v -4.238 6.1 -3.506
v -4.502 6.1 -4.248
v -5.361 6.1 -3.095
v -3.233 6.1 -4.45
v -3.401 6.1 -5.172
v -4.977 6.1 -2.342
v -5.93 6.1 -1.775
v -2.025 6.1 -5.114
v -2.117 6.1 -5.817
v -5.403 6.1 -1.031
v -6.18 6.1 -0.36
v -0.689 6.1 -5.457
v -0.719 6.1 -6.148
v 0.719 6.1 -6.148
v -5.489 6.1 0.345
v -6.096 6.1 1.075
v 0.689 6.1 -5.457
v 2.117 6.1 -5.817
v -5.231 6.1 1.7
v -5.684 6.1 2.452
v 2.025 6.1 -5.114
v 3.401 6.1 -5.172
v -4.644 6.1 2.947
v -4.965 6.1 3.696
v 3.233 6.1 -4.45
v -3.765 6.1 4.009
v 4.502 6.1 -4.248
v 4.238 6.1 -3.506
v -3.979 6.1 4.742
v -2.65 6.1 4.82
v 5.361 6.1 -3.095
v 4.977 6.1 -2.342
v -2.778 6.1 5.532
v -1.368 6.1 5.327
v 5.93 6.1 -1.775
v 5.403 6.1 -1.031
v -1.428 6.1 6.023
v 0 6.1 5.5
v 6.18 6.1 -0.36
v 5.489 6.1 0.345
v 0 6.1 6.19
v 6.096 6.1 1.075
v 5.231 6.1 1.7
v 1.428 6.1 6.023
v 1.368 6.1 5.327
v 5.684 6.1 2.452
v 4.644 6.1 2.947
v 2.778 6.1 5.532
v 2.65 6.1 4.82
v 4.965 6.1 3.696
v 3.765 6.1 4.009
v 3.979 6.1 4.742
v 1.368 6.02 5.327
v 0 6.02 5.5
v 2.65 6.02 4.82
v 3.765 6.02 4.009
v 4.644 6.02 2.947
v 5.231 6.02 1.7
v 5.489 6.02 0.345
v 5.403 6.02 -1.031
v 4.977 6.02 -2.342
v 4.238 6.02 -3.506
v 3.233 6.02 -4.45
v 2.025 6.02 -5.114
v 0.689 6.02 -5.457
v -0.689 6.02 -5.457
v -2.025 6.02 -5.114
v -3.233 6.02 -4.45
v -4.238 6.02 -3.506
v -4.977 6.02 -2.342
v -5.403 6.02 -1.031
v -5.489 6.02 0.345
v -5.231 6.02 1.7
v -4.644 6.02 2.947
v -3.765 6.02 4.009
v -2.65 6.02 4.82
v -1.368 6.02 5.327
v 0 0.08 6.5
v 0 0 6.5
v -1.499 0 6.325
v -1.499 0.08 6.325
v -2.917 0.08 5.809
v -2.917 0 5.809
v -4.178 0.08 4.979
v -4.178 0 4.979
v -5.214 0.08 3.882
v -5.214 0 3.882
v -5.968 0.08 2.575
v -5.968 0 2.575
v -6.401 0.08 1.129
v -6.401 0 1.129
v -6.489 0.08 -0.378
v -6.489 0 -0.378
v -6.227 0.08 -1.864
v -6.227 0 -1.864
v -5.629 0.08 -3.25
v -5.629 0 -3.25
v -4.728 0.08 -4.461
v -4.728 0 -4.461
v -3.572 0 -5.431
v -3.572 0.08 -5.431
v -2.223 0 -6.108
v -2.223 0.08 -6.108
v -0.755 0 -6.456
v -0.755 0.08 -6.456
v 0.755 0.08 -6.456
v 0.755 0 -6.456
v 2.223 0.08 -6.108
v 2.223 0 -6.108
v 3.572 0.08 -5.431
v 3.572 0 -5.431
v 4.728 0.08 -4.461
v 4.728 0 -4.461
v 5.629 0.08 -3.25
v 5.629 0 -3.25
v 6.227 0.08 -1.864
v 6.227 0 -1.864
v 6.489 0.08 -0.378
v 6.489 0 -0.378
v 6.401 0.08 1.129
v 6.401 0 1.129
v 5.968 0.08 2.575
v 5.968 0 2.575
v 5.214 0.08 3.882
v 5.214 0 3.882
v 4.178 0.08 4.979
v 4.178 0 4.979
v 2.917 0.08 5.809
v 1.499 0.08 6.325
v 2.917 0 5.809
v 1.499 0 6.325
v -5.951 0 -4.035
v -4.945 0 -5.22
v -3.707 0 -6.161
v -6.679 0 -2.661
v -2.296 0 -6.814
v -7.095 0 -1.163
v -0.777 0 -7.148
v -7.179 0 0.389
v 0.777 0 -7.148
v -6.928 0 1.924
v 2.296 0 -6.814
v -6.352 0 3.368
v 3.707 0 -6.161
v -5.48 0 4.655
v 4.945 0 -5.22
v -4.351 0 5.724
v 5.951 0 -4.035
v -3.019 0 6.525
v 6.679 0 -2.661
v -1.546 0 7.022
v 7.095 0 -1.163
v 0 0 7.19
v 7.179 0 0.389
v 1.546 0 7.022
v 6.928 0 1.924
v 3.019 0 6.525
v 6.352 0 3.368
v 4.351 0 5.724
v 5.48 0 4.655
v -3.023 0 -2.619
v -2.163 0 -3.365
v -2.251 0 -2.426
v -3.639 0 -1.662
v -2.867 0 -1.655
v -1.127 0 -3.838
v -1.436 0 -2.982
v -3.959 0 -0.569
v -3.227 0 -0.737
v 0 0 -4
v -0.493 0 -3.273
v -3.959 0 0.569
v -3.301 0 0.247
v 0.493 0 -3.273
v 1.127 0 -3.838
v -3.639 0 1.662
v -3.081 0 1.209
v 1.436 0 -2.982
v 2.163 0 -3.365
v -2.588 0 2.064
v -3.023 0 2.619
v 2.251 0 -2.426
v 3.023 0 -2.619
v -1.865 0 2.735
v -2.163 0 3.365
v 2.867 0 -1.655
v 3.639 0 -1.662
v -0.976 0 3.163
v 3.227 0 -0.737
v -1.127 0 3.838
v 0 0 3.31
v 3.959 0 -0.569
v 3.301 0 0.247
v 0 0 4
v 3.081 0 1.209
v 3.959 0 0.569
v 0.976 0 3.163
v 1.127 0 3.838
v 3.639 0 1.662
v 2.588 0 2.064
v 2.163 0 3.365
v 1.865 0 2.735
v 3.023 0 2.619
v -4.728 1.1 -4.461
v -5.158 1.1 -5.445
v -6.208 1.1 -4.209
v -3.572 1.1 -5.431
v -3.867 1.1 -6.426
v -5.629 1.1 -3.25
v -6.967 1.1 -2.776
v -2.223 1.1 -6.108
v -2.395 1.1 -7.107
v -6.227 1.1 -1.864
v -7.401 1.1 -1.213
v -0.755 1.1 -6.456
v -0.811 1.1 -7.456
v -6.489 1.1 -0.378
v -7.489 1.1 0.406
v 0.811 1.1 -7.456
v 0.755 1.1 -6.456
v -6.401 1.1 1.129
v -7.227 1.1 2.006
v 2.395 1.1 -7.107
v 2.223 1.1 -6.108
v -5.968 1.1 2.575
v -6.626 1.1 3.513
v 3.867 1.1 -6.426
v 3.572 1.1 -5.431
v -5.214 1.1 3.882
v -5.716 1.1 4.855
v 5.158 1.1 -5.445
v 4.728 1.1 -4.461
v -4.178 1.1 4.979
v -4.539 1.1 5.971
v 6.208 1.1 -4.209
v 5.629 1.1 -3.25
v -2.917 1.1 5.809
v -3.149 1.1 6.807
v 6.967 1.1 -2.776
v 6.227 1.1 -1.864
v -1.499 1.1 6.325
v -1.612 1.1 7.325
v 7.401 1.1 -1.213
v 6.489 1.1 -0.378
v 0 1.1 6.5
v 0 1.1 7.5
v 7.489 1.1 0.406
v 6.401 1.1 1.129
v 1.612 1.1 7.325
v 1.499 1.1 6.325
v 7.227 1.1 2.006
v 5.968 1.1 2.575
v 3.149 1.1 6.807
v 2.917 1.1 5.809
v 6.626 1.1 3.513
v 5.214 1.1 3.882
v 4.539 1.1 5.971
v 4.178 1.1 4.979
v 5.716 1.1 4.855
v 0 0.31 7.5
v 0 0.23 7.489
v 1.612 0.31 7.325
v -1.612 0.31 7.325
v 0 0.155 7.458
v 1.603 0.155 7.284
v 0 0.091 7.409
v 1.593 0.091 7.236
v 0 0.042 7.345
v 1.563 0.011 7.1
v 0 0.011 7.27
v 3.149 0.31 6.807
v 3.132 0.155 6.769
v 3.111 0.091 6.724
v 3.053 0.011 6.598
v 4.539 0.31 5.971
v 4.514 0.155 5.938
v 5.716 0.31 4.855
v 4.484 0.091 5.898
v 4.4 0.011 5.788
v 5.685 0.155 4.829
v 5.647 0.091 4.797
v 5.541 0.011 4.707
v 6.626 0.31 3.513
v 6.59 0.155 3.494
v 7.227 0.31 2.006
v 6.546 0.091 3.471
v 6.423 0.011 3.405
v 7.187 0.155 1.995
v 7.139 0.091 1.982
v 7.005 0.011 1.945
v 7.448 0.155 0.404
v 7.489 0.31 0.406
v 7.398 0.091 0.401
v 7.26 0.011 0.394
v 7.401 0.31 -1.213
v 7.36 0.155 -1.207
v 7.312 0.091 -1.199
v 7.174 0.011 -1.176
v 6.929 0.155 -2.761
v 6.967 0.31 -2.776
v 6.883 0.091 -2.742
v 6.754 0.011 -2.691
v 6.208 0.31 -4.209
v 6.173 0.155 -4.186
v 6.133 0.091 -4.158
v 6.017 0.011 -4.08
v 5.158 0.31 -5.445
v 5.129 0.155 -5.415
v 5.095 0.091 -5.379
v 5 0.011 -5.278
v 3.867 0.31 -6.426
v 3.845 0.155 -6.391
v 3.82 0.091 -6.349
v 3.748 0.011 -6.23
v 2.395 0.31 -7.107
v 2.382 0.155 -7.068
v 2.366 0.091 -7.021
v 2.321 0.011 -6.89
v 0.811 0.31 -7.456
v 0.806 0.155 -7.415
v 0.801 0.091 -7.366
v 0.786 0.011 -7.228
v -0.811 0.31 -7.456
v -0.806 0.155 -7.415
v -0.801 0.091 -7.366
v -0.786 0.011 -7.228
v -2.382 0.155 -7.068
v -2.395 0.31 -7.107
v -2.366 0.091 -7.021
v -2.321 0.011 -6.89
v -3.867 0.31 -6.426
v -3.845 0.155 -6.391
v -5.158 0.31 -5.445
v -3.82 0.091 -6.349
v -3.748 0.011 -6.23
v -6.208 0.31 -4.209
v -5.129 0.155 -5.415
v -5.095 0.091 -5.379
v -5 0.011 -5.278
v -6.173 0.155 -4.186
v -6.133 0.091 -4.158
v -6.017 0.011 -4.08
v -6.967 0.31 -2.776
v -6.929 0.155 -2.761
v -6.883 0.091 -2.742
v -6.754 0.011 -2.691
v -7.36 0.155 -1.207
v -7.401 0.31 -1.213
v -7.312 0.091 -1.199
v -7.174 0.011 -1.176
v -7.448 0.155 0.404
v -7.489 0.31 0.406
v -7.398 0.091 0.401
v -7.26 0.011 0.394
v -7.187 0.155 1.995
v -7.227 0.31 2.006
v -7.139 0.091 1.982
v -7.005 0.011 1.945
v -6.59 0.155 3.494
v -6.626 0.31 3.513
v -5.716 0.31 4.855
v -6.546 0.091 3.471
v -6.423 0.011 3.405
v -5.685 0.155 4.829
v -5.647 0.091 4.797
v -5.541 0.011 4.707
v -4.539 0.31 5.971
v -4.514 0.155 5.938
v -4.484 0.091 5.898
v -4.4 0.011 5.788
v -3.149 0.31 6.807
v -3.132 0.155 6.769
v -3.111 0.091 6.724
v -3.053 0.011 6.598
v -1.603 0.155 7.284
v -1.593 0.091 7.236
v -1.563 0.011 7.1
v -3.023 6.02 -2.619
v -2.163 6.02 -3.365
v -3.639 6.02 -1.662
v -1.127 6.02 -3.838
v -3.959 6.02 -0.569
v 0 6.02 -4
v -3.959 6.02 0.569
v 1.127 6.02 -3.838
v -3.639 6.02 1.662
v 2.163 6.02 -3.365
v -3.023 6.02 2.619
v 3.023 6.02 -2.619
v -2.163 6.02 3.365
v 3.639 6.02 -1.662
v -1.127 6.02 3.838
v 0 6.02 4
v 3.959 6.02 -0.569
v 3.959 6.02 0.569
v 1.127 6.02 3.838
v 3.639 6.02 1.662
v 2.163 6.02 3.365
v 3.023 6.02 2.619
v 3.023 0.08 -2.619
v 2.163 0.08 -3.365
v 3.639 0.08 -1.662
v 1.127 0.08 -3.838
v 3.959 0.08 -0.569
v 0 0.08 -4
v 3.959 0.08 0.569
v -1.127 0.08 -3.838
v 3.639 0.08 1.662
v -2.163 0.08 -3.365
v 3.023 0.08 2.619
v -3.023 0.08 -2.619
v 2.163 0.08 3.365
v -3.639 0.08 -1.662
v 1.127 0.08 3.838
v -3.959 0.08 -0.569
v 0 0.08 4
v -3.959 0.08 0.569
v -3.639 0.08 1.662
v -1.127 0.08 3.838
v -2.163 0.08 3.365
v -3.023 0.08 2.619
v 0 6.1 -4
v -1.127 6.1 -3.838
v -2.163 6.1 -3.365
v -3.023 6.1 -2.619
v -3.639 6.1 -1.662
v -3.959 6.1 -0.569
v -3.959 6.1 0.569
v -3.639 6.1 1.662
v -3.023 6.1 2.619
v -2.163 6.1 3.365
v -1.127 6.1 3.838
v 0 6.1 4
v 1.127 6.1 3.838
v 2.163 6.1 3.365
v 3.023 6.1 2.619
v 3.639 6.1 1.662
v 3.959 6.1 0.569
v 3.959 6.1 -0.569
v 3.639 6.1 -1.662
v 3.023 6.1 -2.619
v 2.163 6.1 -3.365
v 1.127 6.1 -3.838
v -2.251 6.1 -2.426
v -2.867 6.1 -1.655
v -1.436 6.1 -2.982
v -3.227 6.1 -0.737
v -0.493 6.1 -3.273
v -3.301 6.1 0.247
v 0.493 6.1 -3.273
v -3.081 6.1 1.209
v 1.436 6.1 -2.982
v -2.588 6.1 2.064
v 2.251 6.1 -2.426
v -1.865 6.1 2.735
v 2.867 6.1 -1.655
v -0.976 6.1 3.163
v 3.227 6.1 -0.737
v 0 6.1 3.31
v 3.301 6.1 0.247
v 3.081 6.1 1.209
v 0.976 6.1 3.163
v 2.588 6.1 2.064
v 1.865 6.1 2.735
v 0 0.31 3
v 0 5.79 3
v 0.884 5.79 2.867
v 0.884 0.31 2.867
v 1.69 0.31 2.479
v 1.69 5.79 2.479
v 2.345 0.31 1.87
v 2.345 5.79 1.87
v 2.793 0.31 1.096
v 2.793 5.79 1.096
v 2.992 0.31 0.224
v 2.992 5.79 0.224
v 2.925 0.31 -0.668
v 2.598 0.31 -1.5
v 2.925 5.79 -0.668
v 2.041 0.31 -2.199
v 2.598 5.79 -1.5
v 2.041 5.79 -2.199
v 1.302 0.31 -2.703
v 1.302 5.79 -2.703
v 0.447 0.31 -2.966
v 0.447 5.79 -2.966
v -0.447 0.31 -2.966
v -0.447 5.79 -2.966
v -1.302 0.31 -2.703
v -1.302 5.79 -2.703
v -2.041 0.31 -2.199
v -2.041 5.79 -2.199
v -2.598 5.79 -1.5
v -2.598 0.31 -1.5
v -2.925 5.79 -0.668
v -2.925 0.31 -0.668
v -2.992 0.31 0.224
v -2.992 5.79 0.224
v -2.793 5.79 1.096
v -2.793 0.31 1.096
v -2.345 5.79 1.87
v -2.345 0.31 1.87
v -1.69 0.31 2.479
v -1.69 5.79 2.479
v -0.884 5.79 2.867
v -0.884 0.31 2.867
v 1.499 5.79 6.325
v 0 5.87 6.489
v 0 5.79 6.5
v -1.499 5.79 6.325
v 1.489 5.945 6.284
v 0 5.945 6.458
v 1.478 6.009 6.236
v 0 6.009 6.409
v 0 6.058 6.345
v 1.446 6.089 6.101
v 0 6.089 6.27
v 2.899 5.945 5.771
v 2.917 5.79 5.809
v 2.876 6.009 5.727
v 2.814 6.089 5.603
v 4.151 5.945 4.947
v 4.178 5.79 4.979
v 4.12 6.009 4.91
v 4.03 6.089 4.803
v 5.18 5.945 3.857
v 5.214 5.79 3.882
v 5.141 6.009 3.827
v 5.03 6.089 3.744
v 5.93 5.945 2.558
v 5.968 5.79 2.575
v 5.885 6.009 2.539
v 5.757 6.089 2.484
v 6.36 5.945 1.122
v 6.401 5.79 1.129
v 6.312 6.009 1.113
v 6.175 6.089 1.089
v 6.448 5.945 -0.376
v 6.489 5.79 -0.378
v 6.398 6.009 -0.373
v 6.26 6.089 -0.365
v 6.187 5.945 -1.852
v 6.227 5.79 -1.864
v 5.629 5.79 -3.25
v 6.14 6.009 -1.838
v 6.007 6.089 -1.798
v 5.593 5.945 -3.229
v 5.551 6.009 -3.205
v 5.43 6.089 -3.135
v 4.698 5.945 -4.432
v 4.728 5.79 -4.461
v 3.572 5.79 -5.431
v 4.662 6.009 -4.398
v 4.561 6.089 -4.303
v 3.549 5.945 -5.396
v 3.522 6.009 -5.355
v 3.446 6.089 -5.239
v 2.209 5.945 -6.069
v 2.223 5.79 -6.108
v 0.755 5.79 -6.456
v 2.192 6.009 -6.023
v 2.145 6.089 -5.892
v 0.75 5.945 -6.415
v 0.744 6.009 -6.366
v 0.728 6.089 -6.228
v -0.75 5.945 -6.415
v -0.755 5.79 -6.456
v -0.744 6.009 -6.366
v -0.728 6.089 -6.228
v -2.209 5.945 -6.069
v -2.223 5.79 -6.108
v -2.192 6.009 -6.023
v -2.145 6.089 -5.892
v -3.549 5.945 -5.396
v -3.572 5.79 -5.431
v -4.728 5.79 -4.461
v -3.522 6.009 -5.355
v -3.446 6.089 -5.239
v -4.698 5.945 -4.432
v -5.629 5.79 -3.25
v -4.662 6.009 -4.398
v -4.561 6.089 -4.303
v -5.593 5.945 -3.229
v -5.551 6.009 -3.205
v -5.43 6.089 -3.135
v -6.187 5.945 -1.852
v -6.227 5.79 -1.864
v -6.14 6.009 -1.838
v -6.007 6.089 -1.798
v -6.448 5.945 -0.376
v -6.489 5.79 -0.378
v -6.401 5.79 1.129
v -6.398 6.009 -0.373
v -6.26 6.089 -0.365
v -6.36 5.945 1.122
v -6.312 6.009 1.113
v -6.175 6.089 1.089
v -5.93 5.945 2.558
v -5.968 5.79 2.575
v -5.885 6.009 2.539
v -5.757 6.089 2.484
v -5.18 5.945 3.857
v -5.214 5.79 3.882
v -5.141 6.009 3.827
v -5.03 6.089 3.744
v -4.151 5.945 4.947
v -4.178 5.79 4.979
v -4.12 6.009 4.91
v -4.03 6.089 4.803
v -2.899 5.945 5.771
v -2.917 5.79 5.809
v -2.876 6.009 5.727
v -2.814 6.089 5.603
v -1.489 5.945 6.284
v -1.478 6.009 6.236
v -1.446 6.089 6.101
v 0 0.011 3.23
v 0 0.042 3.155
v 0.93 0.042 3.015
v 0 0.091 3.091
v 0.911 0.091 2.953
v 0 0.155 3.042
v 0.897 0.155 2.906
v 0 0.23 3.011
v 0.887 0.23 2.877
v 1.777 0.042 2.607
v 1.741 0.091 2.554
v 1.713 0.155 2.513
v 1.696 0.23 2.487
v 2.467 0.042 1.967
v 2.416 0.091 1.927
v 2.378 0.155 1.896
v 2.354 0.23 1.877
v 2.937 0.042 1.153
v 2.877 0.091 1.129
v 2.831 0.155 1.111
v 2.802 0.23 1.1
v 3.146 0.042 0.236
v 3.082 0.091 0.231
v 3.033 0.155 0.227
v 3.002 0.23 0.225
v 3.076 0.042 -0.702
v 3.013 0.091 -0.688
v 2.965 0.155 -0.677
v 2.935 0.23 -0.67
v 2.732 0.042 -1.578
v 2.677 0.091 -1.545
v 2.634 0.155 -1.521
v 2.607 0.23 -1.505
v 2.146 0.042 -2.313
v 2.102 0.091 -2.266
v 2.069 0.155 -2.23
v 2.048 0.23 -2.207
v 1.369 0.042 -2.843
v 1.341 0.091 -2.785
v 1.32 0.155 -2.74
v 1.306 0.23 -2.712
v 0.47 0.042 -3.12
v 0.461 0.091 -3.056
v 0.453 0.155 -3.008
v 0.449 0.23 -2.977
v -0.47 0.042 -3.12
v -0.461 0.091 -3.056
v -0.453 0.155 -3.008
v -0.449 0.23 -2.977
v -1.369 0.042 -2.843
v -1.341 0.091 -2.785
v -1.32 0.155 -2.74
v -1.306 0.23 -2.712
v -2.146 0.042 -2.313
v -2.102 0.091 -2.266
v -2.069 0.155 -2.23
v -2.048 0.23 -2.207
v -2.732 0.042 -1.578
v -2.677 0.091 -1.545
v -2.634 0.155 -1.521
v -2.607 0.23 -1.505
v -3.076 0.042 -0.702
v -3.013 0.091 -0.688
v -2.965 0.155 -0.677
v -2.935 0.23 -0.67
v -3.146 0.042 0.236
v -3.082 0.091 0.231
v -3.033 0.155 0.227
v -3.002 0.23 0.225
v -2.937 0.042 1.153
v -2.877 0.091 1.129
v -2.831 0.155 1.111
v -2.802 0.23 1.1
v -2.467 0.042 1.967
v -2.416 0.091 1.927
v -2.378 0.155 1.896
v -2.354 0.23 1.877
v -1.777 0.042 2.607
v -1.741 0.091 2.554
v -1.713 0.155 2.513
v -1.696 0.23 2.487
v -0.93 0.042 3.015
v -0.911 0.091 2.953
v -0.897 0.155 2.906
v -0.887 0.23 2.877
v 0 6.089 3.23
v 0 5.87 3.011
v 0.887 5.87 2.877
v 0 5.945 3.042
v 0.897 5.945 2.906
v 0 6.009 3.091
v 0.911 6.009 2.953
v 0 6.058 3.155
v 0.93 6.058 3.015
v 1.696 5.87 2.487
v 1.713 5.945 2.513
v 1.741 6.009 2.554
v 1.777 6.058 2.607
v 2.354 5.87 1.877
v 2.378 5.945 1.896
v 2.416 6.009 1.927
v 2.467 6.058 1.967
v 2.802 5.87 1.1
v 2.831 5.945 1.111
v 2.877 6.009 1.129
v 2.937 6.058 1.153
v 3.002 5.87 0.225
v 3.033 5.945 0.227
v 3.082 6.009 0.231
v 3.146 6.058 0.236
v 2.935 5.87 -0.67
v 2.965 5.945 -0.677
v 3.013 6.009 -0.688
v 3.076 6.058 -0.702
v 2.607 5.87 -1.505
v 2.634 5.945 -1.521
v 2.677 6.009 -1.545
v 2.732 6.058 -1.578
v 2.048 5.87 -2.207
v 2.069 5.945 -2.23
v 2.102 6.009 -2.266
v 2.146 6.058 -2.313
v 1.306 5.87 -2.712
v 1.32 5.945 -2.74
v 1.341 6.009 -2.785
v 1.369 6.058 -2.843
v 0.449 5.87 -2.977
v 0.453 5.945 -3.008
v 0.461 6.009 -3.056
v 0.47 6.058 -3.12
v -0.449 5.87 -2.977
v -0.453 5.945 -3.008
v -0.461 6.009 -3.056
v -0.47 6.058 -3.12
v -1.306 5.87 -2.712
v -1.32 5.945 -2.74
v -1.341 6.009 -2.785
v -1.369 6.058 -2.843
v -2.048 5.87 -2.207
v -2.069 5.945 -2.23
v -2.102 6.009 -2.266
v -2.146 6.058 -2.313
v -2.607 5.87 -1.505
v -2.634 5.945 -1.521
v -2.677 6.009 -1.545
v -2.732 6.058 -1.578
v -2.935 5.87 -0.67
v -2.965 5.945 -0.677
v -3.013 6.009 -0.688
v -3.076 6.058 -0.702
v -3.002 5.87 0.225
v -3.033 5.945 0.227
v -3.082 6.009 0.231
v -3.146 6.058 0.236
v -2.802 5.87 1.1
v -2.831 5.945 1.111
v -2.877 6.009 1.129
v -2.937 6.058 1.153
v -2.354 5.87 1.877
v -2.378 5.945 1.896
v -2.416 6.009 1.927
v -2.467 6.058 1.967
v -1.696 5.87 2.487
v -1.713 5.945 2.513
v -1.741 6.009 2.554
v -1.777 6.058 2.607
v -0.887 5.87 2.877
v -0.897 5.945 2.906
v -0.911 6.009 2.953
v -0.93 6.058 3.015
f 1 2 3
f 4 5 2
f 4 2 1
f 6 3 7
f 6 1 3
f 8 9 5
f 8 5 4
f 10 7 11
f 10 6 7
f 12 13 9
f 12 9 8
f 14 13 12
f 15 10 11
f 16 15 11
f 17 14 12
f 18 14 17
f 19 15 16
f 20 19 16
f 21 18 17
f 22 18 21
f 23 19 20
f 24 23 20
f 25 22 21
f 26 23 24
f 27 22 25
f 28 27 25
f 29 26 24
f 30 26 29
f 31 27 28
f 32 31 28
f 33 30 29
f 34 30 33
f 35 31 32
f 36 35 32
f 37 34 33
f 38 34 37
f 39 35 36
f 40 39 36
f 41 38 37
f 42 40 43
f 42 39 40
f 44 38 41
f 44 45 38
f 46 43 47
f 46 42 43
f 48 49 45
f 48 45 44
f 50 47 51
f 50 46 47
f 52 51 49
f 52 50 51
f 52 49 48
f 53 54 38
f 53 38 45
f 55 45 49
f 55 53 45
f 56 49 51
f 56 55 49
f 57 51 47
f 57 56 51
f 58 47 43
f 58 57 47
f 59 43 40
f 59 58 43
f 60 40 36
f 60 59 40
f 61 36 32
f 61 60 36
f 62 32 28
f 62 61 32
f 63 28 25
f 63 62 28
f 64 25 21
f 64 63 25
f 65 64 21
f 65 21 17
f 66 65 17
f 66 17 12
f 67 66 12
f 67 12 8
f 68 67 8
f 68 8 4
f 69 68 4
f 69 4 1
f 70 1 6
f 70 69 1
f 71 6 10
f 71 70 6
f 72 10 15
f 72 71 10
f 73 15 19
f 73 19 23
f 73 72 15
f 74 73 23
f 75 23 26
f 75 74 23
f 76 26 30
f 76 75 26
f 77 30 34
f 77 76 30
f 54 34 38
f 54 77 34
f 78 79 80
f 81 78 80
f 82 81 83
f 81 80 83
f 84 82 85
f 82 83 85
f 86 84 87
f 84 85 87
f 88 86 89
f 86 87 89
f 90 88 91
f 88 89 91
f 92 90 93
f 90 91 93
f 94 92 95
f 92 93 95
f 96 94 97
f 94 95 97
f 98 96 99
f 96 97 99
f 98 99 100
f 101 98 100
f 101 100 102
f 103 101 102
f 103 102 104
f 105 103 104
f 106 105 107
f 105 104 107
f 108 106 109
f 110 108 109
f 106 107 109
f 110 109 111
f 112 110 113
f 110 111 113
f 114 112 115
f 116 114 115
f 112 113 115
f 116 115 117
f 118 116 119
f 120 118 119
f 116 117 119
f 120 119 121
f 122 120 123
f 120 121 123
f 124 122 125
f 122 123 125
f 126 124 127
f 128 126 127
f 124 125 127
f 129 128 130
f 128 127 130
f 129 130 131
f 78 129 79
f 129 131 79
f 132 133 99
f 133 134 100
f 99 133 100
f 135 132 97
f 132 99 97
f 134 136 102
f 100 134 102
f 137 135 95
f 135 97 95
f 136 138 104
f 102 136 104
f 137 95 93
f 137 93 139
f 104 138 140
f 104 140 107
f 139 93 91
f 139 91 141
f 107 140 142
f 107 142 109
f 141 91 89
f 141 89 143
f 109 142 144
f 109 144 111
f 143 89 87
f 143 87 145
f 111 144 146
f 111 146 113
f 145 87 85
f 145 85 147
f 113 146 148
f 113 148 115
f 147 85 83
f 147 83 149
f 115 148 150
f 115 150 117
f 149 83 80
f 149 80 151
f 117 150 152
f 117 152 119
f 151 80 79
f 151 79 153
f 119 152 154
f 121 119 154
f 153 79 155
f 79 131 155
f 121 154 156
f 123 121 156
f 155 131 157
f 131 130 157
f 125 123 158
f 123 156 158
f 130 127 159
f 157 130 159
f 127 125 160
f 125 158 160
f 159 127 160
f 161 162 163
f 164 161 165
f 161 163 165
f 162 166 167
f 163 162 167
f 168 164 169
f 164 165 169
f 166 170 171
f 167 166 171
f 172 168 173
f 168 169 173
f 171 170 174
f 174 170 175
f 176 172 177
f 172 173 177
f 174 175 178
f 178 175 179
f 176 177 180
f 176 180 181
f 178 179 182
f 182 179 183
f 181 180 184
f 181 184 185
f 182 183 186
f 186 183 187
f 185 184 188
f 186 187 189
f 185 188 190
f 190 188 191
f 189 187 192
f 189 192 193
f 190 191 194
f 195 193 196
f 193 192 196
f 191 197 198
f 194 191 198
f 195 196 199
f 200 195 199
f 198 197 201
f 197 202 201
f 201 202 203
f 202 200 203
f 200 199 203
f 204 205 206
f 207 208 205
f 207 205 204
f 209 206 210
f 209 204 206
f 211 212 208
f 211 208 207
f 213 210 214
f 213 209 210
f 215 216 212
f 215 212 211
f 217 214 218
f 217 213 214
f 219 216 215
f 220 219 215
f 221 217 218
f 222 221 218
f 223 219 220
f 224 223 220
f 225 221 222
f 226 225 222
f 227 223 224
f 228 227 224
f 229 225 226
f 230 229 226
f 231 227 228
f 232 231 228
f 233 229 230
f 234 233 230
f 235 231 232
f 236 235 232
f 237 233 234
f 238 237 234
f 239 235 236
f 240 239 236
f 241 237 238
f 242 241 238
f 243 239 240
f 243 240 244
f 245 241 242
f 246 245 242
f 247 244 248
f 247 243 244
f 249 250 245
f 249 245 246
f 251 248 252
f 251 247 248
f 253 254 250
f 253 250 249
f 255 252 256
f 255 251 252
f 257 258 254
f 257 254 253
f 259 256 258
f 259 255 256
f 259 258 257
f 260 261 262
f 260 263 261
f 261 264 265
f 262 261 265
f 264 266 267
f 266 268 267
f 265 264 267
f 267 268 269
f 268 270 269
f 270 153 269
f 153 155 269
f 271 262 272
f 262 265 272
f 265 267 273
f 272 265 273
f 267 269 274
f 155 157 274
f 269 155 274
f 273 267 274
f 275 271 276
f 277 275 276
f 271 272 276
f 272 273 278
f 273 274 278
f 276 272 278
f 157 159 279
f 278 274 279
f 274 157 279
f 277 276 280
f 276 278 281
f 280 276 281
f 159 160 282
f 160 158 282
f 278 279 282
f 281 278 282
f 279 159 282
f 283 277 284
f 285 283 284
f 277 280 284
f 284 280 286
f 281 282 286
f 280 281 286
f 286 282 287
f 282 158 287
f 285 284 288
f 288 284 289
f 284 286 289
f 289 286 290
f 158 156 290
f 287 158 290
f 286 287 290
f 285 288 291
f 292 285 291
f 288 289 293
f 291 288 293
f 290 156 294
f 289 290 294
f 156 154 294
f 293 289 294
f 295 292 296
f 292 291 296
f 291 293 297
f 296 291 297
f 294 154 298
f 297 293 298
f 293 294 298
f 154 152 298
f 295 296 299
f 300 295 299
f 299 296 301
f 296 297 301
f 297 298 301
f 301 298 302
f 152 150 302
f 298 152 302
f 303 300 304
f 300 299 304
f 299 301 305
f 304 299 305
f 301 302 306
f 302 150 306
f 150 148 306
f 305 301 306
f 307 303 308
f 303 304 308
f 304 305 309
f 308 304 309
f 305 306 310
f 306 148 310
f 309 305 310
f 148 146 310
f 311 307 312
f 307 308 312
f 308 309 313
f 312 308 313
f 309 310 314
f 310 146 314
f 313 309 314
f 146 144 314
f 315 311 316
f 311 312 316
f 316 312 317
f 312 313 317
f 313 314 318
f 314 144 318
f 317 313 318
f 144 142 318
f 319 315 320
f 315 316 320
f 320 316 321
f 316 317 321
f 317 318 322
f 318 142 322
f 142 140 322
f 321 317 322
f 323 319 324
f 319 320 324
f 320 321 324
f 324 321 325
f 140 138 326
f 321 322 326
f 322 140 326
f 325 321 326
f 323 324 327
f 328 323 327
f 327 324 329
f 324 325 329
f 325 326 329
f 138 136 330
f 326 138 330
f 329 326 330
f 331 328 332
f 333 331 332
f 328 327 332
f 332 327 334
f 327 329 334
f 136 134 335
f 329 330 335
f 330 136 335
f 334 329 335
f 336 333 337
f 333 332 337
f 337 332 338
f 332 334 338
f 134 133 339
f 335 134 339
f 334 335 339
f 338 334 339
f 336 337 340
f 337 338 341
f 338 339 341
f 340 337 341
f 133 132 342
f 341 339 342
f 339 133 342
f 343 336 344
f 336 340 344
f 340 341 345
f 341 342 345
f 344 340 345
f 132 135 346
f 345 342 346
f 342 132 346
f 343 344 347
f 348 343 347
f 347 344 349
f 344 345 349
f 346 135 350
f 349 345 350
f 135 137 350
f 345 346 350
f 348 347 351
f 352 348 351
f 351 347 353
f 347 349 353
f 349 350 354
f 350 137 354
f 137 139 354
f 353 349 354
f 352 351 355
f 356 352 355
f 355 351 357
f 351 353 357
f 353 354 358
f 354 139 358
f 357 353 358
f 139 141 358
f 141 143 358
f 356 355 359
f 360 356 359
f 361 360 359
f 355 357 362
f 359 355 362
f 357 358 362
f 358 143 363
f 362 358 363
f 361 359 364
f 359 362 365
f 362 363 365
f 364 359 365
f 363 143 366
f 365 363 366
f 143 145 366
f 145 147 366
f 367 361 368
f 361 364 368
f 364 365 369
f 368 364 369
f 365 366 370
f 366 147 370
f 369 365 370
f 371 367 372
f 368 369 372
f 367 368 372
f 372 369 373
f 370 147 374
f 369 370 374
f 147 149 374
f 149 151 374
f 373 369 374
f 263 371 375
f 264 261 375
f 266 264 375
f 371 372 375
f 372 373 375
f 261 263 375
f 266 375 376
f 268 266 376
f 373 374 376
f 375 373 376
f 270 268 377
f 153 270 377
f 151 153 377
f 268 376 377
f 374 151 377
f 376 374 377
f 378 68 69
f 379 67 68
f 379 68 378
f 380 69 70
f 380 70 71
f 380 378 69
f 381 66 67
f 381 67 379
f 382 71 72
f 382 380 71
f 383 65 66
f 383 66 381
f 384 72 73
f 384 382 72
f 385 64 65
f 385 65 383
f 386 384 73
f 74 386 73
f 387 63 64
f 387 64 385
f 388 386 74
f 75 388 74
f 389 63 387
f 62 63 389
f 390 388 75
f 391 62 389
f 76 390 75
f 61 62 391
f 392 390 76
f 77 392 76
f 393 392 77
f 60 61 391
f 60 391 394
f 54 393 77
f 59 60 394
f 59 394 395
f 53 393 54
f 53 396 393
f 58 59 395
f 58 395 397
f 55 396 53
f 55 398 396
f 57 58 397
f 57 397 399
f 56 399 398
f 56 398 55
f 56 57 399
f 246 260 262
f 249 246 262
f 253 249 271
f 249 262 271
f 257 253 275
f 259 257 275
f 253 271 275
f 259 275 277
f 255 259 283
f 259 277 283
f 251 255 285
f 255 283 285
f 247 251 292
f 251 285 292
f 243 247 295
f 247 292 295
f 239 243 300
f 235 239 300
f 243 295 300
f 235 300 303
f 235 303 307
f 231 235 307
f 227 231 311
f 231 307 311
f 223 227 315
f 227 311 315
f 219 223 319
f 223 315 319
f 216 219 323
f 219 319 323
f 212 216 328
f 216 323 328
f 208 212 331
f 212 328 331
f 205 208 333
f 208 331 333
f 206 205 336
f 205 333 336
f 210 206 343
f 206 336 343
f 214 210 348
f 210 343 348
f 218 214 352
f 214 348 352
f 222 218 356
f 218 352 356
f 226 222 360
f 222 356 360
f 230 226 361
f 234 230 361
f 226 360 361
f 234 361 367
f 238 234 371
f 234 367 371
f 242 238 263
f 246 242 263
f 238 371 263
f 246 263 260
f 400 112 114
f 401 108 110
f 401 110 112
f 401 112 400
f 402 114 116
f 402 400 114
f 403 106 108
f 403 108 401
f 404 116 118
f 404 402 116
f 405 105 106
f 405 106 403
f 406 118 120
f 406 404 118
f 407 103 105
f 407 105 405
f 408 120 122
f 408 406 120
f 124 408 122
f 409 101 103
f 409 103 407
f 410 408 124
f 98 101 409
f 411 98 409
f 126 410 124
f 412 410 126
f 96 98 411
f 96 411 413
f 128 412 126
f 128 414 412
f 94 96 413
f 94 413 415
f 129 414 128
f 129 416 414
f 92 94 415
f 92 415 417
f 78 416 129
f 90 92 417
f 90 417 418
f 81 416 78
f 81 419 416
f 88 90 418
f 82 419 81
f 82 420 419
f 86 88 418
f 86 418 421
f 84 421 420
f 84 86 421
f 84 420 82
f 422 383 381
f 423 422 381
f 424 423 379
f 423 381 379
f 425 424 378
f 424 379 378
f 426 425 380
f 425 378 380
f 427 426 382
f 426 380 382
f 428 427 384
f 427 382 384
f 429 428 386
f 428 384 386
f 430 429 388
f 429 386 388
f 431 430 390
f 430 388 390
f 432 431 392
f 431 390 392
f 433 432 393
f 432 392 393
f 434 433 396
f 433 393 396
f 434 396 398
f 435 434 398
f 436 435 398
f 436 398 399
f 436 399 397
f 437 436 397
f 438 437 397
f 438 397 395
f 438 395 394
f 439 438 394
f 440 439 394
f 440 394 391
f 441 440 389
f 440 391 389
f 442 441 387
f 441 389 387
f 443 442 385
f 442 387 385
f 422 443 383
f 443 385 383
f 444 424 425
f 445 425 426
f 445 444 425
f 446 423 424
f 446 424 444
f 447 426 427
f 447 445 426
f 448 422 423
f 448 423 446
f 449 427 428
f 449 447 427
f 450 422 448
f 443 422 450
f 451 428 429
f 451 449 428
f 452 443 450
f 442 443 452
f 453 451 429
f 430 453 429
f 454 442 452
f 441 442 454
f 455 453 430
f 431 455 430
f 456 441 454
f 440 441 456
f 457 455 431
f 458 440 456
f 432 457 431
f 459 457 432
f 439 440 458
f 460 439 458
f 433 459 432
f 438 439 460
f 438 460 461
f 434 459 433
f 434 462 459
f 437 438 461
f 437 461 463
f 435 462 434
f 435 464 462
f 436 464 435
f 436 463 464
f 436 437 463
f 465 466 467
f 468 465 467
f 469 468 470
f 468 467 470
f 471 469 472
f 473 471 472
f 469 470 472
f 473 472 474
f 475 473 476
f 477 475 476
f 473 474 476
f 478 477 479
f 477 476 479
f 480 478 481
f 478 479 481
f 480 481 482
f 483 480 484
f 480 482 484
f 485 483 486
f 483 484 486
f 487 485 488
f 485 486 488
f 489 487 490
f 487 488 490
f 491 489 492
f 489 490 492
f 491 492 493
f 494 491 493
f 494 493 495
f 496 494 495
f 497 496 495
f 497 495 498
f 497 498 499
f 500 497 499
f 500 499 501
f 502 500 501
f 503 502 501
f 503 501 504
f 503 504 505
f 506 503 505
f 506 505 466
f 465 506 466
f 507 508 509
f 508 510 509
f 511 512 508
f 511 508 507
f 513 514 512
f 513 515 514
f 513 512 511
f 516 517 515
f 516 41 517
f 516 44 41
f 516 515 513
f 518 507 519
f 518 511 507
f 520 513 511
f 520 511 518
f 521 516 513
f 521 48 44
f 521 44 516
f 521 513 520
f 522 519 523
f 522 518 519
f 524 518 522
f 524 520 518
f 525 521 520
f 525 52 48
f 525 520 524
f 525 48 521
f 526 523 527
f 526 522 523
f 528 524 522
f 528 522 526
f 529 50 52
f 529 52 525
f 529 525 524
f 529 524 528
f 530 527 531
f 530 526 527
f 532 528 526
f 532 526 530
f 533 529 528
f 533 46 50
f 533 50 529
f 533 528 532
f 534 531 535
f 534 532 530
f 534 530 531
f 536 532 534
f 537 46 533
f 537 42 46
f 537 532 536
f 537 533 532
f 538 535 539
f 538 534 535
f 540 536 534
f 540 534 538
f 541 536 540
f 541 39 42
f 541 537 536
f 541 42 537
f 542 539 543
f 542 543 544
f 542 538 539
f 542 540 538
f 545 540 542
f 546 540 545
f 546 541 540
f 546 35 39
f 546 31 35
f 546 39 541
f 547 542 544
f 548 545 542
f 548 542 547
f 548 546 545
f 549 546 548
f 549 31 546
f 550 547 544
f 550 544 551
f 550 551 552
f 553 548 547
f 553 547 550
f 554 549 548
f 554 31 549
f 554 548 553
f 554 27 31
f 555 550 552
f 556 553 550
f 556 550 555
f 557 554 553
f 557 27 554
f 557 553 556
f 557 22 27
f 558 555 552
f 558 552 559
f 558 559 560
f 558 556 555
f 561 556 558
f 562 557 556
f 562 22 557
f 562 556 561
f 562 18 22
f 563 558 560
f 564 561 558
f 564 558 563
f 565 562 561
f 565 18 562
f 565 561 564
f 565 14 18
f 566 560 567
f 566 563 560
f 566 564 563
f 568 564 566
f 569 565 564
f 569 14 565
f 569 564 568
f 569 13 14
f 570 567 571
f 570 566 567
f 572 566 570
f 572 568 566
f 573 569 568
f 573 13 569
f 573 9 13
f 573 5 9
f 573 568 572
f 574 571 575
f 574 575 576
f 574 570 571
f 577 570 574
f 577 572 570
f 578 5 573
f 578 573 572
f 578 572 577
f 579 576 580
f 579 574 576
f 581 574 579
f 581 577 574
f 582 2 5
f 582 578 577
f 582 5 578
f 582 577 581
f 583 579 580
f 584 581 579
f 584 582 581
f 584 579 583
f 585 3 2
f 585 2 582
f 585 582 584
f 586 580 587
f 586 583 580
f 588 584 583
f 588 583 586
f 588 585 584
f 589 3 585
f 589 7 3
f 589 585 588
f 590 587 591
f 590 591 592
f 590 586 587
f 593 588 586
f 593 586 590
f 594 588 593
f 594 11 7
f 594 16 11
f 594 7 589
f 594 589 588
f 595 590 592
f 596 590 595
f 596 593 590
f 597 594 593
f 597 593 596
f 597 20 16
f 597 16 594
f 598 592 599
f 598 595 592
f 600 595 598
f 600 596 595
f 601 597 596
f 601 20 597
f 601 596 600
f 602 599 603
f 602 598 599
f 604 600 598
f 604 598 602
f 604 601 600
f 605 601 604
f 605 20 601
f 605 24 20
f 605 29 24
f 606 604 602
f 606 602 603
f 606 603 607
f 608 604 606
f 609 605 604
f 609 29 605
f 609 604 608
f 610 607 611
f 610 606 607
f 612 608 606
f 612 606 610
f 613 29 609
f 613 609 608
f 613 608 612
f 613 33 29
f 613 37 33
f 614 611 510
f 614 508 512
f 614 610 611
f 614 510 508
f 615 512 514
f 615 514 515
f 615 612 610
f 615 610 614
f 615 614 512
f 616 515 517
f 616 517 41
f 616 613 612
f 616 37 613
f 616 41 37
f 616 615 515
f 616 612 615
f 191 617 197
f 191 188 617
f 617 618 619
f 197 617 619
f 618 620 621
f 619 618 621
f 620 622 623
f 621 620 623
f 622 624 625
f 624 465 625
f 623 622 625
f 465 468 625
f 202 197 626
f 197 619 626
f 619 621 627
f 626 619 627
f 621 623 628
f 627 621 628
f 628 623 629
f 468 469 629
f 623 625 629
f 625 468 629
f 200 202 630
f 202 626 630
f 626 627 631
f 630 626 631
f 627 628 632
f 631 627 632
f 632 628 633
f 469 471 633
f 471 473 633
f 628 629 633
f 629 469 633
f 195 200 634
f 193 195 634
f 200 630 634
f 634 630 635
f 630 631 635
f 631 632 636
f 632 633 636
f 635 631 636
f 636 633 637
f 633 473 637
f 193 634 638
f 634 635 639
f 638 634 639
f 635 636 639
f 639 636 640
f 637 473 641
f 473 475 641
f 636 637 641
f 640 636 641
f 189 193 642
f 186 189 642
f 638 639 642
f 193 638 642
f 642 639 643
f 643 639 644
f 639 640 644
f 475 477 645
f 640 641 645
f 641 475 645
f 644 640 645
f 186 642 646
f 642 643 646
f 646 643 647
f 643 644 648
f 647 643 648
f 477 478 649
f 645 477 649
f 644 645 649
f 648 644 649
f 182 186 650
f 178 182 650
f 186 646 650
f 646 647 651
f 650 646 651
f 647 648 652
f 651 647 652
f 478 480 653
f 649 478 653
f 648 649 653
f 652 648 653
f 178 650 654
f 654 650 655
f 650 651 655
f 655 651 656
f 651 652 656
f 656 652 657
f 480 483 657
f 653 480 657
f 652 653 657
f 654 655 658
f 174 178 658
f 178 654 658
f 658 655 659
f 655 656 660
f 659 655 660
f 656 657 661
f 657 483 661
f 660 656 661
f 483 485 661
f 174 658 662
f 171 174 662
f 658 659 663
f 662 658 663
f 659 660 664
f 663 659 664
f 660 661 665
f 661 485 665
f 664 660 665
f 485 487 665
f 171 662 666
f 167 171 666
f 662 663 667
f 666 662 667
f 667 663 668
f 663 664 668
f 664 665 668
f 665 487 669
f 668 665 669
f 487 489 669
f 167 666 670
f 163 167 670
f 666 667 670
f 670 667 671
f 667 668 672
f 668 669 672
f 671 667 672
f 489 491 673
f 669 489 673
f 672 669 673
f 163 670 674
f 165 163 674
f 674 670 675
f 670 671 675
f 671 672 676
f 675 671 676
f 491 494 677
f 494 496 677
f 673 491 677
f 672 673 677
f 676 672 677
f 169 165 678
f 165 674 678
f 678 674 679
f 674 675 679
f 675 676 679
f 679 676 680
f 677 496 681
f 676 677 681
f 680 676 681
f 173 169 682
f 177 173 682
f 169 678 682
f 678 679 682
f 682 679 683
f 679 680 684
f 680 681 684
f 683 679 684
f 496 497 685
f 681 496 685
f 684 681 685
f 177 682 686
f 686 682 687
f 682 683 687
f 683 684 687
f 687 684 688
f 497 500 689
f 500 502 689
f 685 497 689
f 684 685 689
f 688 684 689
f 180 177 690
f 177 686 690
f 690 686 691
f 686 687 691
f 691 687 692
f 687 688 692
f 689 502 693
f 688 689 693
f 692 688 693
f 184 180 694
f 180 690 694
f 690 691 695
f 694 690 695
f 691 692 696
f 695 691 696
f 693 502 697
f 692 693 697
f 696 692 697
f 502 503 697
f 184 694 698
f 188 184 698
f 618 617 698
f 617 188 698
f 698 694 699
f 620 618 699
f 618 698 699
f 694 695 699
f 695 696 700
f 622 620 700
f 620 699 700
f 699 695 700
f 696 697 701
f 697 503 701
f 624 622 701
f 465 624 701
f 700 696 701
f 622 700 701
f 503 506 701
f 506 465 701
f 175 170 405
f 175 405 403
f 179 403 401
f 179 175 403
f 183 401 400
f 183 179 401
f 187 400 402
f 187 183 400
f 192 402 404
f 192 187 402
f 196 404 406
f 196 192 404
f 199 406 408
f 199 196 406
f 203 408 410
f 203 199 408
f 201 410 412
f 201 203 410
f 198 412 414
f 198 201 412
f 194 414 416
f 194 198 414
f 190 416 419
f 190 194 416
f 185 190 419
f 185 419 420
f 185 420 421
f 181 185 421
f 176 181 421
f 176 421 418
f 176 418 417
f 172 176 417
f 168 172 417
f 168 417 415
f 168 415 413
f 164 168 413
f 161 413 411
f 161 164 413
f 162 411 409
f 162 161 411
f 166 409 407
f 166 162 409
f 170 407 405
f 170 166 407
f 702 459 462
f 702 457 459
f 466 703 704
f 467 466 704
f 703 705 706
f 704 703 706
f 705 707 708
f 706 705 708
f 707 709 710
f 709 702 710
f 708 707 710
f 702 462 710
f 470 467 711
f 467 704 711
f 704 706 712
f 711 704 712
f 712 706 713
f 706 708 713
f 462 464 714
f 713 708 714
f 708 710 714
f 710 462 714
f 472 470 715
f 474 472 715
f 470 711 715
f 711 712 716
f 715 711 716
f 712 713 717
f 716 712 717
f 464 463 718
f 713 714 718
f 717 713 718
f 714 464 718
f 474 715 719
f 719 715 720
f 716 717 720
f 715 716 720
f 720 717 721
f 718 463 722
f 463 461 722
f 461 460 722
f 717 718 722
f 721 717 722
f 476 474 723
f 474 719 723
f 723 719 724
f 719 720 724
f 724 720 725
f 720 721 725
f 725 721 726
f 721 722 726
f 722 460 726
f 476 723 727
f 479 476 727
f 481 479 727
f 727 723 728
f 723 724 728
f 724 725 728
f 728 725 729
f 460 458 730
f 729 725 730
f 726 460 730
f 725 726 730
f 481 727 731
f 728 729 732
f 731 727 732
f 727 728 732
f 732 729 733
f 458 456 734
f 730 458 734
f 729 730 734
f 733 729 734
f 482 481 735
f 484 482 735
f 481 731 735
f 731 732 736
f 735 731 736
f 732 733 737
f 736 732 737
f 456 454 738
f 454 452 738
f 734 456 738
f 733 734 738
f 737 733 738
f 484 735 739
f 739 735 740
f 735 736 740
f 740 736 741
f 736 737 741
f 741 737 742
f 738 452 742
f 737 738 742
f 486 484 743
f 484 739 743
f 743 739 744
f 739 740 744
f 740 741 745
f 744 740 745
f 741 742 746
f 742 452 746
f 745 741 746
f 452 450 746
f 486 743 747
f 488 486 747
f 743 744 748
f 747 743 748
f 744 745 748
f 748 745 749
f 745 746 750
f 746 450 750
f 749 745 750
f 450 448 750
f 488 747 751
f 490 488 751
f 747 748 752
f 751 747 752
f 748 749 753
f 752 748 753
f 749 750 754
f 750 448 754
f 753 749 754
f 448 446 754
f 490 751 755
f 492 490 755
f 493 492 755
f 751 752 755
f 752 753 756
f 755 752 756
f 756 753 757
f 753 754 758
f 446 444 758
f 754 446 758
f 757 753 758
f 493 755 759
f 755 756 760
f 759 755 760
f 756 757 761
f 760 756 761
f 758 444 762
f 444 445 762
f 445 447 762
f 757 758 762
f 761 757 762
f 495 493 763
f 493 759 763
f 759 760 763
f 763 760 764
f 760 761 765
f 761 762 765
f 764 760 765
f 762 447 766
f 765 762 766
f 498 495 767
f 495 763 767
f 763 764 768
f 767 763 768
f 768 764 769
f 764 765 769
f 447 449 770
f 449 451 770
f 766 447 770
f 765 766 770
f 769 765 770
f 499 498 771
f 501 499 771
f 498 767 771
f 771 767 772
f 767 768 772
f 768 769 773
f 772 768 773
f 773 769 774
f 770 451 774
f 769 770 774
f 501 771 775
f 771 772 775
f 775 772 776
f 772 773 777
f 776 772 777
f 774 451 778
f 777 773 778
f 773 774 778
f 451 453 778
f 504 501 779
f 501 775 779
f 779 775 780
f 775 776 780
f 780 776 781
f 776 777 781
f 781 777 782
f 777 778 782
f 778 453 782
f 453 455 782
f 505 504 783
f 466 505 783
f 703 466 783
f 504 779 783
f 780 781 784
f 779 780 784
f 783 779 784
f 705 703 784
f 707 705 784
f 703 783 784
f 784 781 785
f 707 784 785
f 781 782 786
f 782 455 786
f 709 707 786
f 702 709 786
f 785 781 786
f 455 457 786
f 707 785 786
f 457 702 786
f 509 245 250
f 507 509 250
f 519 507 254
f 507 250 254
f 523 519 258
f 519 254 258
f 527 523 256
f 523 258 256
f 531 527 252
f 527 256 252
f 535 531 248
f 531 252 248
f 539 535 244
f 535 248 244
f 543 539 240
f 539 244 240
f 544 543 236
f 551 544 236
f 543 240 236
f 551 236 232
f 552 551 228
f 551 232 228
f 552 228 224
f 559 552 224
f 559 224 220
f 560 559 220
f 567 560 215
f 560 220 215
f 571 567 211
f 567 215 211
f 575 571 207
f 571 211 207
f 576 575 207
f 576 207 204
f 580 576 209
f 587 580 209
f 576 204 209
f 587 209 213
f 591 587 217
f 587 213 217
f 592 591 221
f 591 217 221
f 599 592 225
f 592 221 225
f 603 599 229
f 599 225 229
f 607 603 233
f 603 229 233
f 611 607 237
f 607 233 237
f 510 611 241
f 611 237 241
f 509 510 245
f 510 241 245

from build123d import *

# Parameters (mm, degrees)
SKETCH1_R           = 7.5
BOSS_EXTRUDE1_DEPTH = 1.1
SKETCH2_R           = 6.5
BOSS_EXTRUDE2_DEPTH = 5
SKETCH3_R           = 3
CUT_EXTRUDE1_DEPTH  = 13.235603786
SKETCH4_R           = 6.5
SKETCH4_R_2         = 4
CUT_EXTRUDE2_DEPTH  = 0.08
CUT_EXTRUDE3_START  = -0.08
SKETCH5_R           = 5.5
SKETCH5_R_2         = 4
CUT_EXTRUDE3_DEPTH  = 0.08
FILLET1_R           = 0.31


with BuildPart() as part:
    # Sketch1 → Boss-Extrude1 (new body)
    with BuildSketch(Plane(origin=(0, 0, 0), x_dir=(1, 0, 0), z_dir=(0, 1, 0))):
        with Locations(Location((0, 0, 0), (0, 0, 270))):
            Circle(SKETCH1_R)
    extrude(amount=BOSS_EXTRUDE1_DEPTH)

    # Sketch2 → Boss-Extrude2 (add)
    with BuildSketch(Plane(origin=(0, 1.1, 0), x_dir=(1, 0, 0), z_dir=(0, 1, 0))):
        with Locations(Location((0, 0, 0), (0, 0, 270))):
            Circle(SKETCH2_R)
    extrude(amount=BOSS_EXTRUDE2_DEPTH)

    # Sketch3 → Cut-Extrude1 (cut, through all)
    with BuildSketch(Plane(origin=(0, 6.1, 0), x_dir=(1, 0, 0), z_dir=(0, 1, 0))):
        with Locations(Location((0, 0, 0), (0, 0, 270))):
            Circle(SKETCH3_R)
    extrude(amount=-CUT_EXTRUDE1_DEPTH, mode=Mode.SUBTRACT)

    # Sketch4 → Cut-Extrude2 (cut)
    with BuildSketch(Plane.XZ):
        with Locations(Location((0, 0, 0), (0, 0, 90))):
            Circle(SKETCH4_R)
        with Locations(Location((0, 0, 0), (0, 0, 270))):
            Circle(SKETCH4_R_2, mode=Mode.SUBTRACT)
    extrude(amount=-CUT_EXTRUDE2_DEPTH, mode=Mode.SUBTRACT)

    # Sketch5 → Cut-Extrude3 (cut)
    with BuildSketch(Plane(origin=(0, 6.1, 0), x_dir=(1, 0, 0), z_dir=(0, 1, 0)).offset(CUT_EXTRUDE3_START)):
        with Locations(Location((0, 0, 0), (0, 0, 270))):
            Circle(SKETCH5_R)
        with Locations(Location((0, 0, 0), (0, 0, 90))):
            Circle(SKETCH5_R_2, mode=Mode.SUBTRACT)
    extrude(amount=CUT_EXTRUDE3_DEPTH, mode=Mode.SUBTRACT)

    # Fillet1
    fillet1_edges = [part.edges().sort_by_distance(p)[0] for p in [
        (0, 0, -3),
        (0, 6.1, -3),
        (0, 0, -7.5),
        (0, 6.1, -6.5),
    ]]
    fillet(fillet1_edges, radius=FILLET1_R)


solid = part.part
